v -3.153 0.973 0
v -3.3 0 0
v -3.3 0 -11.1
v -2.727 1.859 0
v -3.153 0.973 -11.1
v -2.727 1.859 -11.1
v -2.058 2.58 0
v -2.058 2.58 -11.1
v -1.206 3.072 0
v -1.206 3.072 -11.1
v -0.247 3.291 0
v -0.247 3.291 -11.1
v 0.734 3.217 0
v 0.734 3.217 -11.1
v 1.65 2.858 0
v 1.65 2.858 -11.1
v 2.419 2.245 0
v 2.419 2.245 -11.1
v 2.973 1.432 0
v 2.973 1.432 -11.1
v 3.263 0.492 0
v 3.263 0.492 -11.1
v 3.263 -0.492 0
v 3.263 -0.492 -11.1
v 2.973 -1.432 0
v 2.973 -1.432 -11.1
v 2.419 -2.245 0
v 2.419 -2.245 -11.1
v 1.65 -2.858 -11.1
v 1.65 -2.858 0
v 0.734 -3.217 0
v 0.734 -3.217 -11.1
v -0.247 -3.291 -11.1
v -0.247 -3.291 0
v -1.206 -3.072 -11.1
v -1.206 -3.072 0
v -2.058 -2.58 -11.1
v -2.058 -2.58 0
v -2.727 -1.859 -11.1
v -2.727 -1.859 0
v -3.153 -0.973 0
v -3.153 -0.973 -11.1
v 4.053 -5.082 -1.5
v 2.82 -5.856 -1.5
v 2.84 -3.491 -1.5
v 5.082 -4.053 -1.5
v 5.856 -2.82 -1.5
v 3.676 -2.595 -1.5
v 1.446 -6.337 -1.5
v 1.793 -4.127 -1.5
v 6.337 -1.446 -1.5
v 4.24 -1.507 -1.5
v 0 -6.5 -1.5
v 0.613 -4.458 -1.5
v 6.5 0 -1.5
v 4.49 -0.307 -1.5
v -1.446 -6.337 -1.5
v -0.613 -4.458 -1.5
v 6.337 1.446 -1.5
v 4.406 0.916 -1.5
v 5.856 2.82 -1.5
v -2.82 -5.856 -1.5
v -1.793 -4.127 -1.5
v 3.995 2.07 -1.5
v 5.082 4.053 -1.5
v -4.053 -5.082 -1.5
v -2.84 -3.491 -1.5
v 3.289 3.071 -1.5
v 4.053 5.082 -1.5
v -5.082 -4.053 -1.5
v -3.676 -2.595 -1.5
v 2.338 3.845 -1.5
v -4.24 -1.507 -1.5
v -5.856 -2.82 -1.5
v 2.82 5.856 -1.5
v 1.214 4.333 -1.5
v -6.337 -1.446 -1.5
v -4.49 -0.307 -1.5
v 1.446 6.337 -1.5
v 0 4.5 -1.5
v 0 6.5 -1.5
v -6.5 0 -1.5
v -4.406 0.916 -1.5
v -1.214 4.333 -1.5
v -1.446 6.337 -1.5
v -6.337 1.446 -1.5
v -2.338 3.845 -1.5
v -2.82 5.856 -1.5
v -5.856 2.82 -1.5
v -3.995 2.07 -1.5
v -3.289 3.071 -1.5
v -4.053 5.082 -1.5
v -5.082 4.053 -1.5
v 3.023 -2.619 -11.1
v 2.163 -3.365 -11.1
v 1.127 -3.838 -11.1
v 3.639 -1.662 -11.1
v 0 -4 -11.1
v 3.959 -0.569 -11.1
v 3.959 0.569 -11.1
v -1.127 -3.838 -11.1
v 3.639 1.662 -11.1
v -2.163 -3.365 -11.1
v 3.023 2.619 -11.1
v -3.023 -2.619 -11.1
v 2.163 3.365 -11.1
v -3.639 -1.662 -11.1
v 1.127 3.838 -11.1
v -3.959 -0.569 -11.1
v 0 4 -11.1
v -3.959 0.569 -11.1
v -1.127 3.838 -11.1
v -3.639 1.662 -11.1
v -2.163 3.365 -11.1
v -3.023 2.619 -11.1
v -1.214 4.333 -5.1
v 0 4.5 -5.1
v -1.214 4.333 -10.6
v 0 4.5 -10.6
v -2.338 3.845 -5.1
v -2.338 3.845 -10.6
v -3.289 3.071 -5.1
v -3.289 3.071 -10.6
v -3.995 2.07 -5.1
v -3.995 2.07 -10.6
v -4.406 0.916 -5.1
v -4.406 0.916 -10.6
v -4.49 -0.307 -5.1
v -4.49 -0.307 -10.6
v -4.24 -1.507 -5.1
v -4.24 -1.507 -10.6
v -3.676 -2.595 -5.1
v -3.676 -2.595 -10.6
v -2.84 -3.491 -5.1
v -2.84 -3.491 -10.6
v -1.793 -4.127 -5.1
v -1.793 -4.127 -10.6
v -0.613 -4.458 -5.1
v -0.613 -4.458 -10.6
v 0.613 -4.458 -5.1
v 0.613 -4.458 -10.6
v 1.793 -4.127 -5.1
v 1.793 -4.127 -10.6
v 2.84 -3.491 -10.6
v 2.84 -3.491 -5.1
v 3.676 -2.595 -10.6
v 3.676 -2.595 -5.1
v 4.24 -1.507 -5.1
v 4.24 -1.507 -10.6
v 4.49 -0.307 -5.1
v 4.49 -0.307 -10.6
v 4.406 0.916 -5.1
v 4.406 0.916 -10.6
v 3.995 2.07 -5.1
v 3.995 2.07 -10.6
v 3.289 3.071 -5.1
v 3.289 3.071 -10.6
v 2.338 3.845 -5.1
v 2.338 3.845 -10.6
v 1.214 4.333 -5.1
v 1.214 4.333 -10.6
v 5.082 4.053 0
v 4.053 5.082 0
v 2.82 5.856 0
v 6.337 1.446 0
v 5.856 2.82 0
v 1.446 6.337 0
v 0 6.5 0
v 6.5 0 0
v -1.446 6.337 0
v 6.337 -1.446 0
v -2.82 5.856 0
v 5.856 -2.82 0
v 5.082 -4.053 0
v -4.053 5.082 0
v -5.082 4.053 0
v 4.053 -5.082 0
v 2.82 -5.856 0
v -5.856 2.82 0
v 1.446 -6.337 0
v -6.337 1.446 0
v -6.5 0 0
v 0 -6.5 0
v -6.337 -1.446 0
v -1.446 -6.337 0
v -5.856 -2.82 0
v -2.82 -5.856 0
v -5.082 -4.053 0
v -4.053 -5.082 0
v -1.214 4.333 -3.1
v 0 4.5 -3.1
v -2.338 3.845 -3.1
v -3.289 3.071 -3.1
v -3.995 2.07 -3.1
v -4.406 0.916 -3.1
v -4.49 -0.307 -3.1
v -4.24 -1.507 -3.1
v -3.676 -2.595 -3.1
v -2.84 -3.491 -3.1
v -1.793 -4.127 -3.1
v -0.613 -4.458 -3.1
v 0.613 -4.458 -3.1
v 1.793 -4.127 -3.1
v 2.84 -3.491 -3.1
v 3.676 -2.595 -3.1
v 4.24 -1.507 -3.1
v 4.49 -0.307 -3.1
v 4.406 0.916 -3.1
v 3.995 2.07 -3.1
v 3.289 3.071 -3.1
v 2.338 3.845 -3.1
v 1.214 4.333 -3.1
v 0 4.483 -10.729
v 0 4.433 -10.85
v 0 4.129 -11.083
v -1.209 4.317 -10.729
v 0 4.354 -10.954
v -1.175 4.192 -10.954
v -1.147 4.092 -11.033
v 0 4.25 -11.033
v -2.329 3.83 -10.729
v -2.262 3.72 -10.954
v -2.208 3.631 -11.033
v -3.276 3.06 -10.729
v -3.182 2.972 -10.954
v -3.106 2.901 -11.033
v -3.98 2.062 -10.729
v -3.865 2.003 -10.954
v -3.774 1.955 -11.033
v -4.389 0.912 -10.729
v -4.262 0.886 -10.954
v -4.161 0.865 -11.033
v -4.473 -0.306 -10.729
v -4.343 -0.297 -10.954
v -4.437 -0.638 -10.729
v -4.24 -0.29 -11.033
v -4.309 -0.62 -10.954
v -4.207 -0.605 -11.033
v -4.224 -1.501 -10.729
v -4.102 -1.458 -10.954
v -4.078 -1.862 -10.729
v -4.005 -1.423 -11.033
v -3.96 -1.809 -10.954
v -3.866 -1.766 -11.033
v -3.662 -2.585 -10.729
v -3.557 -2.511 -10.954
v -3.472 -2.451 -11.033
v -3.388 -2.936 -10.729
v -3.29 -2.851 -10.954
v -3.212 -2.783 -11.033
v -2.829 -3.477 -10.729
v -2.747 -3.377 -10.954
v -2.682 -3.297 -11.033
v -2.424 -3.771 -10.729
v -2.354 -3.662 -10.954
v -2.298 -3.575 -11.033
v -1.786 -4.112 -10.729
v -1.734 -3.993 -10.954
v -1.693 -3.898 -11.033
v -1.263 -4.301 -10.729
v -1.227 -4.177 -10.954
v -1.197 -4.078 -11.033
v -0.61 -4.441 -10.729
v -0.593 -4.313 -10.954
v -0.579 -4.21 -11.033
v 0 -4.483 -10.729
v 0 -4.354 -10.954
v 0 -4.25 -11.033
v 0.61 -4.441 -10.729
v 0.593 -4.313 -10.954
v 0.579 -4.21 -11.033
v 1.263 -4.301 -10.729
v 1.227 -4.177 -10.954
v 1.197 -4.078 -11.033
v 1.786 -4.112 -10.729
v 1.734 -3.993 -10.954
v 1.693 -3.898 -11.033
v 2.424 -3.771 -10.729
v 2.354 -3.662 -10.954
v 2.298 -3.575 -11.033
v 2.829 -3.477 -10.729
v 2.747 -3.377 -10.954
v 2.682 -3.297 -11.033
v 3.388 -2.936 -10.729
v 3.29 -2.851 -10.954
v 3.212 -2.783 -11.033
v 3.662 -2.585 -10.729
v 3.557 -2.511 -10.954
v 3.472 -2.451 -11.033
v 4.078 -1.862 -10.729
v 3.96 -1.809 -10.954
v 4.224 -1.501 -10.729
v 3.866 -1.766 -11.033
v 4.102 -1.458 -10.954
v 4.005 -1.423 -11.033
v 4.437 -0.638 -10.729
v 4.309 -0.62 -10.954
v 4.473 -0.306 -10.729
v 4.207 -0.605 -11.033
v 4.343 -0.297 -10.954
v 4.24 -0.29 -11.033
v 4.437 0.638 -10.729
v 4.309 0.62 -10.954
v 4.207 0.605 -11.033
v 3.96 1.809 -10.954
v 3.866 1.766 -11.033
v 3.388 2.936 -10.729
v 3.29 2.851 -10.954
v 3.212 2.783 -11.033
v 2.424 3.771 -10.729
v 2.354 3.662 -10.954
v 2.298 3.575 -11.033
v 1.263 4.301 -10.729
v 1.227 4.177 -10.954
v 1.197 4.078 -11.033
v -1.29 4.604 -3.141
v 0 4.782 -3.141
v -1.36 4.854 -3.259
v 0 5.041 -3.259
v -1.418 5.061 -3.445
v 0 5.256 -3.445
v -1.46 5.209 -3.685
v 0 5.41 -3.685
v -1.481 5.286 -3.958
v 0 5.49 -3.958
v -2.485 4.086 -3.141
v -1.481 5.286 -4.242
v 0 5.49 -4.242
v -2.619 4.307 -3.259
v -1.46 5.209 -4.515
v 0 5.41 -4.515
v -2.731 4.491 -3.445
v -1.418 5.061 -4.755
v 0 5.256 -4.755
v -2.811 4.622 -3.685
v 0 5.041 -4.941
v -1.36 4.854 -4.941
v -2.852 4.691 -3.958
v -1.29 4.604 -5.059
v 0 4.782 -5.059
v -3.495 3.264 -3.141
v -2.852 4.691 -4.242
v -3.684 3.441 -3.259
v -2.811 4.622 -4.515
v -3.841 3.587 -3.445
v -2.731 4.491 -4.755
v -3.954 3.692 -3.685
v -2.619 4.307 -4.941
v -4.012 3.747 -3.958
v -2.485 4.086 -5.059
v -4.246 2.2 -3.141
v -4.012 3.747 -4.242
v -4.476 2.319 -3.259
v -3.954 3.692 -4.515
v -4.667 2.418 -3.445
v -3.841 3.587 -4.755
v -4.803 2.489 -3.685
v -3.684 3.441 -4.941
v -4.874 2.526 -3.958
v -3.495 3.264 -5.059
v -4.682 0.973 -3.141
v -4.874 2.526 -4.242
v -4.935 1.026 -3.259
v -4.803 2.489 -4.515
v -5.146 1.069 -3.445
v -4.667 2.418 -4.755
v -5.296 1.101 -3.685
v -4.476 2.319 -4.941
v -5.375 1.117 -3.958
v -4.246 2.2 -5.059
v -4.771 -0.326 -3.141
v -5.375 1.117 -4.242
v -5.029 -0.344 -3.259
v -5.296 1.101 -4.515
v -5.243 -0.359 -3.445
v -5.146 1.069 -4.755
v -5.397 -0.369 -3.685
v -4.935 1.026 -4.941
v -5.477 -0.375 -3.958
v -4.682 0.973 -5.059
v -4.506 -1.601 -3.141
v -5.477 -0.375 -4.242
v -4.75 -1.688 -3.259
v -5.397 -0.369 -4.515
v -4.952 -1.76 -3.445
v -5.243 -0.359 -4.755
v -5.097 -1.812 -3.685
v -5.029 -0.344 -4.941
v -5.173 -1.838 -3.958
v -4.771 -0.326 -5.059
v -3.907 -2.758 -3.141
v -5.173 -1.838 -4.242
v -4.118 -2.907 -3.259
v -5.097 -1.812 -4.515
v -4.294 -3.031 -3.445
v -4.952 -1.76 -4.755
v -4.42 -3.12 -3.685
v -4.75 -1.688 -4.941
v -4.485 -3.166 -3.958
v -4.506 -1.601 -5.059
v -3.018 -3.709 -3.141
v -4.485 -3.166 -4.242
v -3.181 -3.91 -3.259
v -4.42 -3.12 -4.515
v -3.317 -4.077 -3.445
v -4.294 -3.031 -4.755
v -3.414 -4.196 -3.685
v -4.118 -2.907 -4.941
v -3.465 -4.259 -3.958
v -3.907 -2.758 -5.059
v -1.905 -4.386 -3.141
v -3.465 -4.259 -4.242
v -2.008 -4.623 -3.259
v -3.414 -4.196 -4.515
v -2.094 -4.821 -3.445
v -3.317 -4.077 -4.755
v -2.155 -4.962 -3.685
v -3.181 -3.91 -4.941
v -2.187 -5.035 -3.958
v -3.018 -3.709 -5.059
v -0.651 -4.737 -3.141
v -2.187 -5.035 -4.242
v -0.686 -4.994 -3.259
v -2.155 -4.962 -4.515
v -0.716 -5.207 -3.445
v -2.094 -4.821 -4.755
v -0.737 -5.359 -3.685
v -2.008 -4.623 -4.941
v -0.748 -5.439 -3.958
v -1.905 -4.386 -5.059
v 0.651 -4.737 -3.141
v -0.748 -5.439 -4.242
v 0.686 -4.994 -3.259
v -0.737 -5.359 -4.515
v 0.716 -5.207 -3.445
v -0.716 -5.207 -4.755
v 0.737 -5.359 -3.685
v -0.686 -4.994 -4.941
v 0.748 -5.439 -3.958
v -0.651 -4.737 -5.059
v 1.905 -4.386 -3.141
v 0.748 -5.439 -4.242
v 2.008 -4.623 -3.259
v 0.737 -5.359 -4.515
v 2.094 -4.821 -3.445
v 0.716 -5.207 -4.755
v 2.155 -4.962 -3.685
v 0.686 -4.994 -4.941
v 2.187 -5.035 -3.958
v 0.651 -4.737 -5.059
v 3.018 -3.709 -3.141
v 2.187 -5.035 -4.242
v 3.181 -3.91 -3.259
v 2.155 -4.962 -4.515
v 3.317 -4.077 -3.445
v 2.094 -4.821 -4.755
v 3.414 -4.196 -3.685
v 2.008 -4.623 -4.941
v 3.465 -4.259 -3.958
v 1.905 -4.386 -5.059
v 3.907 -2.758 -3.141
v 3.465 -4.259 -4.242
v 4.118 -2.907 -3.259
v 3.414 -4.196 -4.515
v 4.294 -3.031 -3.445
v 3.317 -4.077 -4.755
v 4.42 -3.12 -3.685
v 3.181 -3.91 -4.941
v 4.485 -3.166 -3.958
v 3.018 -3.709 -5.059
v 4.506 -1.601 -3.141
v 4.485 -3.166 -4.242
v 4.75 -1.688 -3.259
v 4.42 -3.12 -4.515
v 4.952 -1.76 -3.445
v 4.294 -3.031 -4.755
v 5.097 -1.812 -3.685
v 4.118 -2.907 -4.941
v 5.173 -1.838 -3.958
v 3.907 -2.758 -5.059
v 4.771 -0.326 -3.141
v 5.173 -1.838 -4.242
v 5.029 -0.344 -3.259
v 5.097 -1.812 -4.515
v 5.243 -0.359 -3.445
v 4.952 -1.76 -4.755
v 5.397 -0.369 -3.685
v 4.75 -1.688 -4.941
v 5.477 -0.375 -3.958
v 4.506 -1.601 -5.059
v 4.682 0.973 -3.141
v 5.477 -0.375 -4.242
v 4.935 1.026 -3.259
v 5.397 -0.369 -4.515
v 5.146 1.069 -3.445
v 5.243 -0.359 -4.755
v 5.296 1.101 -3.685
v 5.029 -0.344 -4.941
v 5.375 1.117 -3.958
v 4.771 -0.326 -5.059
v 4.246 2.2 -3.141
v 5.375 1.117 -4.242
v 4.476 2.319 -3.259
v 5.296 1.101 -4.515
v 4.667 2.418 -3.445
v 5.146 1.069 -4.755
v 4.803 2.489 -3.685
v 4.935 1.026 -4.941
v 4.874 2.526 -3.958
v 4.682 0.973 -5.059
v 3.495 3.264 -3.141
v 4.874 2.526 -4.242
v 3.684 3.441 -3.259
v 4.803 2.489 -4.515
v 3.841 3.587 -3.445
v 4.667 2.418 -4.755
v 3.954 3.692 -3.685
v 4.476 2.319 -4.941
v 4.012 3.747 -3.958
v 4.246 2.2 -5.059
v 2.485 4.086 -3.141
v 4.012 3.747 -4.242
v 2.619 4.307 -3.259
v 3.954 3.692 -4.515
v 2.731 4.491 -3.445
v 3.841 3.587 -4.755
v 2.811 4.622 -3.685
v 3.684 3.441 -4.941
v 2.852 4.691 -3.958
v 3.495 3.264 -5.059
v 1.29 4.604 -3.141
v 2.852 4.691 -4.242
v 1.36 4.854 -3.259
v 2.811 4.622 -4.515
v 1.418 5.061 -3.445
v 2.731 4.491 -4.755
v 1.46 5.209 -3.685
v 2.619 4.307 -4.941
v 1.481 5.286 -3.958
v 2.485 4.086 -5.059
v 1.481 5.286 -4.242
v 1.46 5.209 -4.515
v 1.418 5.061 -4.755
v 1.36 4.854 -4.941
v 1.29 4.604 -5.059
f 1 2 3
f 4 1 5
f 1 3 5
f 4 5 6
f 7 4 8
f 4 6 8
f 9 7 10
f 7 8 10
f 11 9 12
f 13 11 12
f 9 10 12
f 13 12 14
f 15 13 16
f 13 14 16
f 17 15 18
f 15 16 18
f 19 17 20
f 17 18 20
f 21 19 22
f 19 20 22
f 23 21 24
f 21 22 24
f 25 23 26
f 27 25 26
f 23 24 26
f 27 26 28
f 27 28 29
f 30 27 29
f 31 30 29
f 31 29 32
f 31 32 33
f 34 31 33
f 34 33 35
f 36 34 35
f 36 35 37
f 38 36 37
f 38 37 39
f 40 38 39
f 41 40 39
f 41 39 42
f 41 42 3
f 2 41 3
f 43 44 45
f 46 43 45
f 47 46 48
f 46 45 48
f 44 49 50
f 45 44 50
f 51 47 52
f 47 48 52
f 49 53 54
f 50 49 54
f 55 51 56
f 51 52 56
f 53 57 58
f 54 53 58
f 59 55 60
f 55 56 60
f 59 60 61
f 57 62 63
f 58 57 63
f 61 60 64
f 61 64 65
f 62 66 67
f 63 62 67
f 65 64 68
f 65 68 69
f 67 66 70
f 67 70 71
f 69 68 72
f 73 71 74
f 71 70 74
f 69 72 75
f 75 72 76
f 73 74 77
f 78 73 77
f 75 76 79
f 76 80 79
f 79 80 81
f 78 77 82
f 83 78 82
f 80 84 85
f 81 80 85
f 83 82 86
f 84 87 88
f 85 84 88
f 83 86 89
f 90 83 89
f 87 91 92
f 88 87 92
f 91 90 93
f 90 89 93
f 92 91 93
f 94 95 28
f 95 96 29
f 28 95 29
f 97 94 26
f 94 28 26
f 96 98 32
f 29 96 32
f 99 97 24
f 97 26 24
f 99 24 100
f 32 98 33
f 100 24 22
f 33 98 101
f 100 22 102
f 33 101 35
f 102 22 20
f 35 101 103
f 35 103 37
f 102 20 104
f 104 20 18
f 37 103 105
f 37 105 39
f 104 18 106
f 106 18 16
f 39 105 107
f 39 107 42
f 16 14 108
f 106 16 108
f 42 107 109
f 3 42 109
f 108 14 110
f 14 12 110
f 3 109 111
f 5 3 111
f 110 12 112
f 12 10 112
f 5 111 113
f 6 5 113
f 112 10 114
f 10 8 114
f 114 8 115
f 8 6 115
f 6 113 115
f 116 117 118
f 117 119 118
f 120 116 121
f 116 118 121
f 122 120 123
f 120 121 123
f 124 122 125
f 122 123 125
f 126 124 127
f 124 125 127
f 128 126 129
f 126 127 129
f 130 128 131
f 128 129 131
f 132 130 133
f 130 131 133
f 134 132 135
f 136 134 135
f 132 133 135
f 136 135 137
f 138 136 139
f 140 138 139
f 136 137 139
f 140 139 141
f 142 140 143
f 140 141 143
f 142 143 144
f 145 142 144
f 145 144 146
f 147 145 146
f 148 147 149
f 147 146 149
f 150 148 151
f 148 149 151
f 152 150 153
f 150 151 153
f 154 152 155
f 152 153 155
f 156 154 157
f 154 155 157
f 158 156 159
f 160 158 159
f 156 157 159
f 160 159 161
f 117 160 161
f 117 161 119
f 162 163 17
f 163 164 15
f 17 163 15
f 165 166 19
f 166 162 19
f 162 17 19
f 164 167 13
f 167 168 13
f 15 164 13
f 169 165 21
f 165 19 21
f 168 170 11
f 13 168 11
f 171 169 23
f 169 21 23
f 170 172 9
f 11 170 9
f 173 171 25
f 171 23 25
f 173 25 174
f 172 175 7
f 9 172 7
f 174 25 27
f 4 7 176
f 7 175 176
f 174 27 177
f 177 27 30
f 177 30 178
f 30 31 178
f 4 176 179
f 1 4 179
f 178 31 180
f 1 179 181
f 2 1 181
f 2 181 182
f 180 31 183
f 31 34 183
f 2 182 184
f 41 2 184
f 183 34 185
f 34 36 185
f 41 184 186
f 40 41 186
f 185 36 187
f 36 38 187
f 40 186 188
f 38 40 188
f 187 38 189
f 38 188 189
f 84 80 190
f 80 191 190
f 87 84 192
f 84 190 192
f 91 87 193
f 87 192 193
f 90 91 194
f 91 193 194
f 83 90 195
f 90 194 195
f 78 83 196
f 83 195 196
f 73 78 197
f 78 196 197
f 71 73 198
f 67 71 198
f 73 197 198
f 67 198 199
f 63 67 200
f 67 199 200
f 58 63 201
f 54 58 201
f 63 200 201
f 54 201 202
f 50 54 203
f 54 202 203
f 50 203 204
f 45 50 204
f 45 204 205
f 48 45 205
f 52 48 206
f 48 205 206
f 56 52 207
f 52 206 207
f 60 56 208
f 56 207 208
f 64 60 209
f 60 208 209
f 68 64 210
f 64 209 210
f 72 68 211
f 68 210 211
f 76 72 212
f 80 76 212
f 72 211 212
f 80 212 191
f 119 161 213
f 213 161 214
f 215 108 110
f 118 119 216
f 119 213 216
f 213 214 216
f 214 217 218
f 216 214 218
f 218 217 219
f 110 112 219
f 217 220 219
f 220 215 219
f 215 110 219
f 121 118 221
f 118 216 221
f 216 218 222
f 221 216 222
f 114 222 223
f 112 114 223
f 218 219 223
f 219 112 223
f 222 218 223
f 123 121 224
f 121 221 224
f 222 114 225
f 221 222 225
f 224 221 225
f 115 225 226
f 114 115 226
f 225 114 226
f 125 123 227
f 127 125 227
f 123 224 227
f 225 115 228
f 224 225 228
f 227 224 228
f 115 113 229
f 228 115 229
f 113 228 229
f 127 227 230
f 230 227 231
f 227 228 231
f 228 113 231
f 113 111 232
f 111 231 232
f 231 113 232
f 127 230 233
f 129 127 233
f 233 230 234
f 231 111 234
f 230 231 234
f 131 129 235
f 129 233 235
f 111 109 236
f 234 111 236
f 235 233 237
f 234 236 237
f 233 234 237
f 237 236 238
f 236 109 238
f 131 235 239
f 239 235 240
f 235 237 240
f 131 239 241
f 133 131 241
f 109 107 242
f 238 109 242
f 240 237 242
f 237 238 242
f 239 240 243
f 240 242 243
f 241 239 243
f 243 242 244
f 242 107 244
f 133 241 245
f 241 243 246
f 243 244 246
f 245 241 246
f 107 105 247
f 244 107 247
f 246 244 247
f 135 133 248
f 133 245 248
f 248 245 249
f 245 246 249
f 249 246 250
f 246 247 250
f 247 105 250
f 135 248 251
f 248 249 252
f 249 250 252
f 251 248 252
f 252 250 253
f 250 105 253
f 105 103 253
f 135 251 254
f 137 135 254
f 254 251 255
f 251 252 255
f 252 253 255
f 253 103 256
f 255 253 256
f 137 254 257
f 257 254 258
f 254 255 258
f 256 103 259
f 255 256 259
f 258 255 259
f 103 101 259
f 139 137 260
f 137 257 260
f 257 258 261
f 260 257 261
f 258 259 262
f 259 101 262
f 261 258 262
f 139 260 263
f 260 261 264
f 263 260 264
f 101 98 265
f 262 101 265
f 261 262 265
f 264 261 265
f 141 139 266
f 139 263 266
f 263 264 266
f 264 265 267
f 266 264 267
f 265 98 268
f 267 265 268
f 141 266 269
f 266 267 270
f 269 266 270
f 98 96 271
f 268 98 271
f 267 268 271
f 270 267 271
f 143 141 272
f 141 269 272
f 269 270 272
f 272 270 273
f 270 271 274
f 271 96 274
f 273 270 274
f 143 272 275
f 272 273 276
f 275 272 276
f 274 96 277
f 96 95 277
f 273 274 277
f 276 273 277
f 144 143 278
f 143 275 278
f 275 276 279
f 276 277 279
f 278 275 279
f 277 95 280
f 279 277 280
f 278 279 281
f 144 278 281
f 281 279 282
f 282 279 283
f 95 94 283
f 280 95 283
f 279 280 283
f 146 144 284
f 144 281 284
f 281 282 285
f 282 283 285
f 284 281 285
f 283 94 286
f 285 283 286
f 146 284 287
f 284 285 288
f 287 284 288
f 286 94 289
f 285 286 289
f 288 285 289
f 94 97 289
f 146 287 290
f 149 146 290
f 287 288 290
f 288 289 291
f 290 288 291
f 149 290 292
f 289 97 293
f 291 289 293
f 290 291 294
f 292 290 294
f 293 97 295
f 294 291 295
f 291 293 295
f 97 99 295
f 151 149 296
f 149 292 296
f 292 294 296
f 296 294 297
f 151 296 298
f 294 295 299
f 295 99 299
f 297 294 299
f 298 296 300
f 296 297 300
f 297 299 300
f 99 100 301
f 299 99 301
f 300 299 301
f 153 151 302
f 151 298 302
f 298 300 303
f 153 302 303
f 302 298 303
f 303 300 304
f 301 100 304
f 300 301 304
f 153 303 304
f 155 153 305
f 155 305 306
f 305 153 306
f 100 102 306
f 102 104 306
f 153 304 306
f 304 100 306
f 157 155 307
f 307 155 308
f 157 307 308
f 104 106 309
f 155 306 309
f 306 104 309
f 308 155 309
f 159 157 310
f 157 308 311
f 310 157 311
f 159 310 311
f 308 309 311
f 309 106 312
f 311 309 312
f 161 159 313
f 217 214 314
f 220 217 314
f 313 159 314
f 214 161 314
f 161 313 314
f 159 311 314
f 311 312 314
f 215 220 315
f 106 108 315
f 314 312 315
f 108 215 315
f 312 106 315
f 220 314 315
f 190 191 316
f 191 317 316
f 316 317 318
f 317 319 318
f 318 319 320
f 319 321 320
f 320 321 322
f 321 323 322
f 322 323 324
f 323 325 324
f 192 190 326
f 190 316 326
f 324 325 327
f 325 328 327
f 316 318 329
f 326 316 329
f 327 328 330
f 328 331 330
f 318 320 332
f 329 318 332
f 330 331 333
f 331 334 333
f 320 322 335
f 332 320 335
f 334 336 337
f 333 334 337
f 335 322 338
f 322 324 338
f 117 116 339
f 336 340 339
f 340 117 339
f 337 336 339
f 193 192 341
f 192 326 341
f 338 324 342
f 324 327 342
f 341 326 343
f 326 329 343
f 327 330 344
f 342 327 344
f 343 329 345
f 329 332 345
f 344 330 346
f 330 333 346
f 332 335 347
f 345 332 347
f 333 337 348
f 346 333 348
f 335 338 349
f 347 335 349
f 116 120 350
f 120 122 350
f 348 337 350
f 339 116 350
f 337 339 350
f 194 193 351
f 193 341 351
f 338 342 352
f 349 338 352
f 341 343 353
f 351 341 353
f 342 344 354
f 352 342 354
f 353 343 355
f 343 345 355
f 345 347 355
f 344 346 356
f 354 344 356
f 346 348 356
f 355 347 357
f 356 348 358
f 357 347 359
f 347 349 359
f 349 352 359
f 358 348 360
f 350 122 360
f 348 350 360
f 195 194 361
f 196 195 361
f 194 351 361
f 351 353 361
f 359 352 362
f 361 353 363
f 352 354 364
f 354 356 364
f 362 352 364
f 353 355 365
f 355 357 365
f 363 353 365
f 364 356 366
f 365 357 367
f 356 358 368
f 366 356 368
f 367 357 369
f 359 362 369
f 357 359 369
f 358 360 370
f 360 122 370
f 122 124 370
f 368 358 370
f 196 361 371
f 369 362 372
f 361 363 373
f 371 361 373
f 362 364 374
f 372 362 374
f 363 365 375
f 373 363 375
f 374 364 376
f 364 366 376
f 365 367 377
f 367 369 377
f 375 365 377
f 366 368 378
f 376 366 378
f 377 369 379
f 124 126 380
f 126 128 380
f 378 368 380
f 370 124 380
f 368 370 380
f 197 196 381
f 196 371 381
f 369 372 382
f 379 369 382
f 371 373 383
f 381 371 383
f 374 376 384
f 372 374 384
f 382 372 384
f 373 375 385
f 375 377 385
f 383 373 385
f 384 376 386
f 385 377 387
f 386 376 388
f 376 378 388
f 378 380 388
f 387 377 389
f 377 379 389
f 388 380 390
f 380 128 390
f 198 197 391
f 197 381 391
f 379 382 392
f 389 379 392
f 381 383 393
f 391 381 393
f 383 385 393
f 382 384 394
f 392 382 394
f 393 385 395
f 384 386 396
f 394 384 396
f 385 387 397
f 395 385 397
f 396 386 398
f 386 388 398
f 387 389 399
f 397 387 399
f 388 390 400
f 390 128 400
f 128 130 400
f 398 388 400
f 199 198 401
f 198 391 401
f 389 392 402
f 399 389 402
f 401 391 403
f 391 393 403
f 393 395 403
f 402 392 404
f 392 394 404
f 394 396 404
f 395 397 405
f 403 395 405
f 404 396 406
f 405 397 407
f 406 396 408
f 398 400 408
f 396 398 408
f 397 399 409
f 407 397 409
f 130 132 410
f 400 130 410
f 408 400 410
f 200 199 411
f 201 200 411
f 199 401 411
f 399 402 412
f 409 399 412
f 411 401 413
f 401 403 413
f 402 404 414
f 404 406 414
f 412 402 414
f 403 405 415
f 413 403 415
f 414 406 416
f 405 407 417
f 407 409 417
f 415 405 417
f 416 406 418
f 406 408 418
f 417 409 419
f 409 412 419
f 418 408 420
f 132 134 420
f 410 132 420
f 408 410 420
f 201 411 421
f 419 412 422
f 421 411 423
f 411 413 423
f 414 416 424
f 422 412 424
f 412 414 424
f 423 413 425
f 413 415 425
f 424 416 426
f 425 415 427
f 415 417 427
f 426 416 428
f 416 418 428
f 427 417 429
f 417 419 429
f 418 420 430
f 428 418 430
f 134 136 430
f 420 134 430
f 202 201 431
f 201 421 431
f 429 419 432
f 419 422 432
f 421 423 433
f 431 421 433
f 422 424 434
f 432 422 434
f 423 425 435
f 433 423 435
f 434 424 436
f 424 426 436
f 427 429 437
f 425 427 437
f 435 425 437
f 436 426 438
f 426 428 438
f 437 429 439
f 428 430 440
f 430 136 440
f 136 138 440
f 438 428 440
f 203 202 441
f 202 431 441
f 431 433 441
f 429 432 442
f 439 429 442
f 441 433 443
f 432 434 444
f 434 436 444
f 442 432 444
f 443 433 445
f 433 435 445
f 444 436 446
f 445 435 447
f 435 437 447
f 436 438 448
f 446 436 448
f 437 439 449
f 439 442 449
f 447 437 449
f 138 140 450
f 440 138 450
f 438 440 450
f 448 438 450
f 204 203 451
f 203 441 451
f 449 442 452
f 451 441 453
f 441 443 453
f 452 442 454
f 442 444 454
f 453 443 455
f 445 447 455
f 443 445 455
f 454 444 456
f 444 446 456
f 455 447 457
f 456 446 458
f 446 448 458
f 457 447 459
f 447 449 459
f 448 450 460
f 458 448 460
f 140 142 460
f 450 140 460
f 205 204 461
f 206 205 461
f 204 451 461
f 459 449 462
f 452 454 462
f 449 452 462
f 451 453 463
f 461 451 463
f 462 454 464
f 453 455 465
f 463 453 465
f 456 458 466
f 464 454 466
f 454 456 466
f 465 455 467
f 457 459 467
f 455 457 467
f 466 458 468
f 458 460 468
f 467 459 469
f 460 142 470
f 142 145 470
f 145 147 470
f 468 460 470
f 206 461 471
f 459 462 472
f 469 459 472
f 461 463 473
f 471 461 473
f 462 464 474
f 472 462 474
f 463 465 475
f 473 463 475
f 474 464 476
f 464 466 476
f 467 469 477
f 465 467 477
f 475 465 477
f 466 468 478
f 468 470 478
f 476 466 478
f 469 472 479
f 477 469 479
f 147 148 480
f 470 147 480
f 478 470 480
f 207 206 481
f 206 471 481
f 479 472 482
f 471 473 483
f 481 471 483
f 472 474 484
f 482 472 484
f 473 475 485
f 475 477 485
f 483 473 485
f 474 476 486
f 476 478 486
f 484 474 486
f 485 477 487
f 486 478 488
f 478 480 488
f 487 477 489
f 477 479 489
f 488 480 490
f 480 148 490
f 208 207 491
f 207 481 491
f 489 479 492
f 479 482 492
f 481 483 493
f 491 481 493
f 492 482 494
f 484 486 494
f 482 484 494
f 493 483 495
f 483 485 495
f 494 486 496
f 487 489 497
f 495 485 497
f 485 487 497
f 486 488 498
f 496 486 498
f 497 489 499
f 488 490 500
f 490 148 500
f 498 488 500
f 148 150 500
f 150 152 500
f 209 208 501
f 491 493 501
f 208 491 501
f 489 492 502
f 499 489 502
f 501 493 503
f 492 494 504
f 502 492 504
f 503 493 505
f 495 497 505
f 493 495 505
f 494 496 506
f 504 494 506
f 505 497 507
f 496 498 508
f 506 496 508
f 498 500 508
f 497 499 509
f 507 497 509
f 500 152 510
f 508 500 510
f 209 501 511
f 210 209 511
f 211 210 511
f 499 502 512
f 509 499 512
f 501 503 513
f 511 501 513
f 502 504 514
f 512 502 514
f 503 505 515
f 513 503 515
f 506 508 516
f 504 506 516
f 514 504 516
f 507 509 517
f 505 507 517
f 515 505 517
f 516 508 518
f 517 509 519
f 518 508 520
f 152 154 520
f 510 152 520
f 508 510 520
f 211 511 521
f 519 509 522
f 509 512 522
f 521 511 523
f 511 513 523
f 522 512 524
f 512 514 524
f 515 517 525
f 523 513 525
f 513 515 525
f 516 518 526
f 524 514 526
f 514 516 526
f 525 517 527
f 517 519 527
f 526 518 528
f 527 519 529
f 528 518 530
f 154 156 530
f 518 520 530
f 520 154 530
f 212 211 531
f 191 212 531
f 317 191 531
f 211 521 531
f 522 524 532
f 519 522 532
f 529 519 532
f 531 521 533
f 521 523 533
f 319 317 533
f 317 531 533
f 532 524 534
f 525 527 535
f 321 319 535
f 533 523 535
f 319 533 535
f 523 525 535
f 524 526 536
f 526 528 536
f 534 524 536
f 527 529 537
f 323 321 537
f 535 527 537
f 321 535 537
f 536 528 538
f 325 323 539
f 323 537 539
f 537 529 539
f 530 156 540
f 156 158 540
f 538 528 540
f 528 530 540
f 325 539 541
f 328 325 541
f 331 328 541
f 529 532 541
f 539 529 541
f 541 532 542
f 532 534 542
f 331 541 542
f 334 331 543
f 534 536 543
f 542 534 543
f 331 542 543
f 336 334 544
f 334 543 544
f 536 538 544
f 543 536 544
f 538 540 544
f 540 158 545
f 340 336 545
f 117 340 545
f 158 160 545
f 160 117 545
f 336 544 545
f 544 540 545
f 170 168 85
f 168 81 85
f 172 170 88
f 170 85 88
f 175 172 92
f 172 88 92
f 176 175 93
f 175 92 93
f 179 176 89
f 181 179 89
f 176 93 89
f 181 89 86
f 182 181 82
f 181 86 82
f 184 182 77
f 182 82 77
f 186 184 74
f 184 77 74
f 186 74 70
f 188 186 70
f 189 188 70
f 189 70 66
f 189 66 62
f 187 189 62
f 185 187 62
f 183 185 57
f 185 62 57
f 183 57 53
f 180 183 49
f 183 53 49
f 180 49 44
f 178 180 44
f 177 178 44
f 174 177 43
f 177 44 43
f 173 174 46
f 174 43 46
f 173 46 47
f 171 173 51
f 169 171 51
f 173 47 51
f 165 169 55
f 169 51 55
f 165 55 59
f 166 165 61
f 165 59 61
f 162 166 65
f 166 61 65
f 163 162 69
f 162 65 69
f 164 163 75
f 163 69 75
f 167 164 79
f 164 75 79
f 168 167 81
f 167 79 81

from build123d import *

# Parameters (mm, degrees)
FURO_COM_FOLGA_DE_M61_D = 6.6


with BuildPart() as part:
    # Esboço1 → Revolução1 (revolve)
    with BuildSketch(Plane(origin=(0, 0, 0), x_dir=(0, 0, -1), z_dir=(1, 0, 0))):
        with BuildLine():
            Line((0, 0), (0, 6.5))
            Line((0, 6.5), (1.5, 6.5))
            Line((1.5, 6.5), (1.5, 4.5))
            Line((1.5, 4.5), (3.1, 4.5))
            ThreePointArc((3.1, 4.5), (4.1, 5.5), (5.1, 4.5))
            Line((5.1, 4.5), (10.6, 4.5))
            ThreePointArc((10.6, 4.5), (10.953553391, 4.353553391), (11.1, 4))
            Line((11.1, 4), (11.1, 0))
            Line((11.1, 0), (0, 0))
        make_face()
    revolve(axis=Axis((0, 0, -11.1), (0, 0, 1)))

    # Furo com folga de M61 (through all)
    with Locations(Plane.XY):
        with Locations((0, 0)):
            Hole(FURO_COM_FOLGA_DE_M61_D / 2)


solid = part.part
